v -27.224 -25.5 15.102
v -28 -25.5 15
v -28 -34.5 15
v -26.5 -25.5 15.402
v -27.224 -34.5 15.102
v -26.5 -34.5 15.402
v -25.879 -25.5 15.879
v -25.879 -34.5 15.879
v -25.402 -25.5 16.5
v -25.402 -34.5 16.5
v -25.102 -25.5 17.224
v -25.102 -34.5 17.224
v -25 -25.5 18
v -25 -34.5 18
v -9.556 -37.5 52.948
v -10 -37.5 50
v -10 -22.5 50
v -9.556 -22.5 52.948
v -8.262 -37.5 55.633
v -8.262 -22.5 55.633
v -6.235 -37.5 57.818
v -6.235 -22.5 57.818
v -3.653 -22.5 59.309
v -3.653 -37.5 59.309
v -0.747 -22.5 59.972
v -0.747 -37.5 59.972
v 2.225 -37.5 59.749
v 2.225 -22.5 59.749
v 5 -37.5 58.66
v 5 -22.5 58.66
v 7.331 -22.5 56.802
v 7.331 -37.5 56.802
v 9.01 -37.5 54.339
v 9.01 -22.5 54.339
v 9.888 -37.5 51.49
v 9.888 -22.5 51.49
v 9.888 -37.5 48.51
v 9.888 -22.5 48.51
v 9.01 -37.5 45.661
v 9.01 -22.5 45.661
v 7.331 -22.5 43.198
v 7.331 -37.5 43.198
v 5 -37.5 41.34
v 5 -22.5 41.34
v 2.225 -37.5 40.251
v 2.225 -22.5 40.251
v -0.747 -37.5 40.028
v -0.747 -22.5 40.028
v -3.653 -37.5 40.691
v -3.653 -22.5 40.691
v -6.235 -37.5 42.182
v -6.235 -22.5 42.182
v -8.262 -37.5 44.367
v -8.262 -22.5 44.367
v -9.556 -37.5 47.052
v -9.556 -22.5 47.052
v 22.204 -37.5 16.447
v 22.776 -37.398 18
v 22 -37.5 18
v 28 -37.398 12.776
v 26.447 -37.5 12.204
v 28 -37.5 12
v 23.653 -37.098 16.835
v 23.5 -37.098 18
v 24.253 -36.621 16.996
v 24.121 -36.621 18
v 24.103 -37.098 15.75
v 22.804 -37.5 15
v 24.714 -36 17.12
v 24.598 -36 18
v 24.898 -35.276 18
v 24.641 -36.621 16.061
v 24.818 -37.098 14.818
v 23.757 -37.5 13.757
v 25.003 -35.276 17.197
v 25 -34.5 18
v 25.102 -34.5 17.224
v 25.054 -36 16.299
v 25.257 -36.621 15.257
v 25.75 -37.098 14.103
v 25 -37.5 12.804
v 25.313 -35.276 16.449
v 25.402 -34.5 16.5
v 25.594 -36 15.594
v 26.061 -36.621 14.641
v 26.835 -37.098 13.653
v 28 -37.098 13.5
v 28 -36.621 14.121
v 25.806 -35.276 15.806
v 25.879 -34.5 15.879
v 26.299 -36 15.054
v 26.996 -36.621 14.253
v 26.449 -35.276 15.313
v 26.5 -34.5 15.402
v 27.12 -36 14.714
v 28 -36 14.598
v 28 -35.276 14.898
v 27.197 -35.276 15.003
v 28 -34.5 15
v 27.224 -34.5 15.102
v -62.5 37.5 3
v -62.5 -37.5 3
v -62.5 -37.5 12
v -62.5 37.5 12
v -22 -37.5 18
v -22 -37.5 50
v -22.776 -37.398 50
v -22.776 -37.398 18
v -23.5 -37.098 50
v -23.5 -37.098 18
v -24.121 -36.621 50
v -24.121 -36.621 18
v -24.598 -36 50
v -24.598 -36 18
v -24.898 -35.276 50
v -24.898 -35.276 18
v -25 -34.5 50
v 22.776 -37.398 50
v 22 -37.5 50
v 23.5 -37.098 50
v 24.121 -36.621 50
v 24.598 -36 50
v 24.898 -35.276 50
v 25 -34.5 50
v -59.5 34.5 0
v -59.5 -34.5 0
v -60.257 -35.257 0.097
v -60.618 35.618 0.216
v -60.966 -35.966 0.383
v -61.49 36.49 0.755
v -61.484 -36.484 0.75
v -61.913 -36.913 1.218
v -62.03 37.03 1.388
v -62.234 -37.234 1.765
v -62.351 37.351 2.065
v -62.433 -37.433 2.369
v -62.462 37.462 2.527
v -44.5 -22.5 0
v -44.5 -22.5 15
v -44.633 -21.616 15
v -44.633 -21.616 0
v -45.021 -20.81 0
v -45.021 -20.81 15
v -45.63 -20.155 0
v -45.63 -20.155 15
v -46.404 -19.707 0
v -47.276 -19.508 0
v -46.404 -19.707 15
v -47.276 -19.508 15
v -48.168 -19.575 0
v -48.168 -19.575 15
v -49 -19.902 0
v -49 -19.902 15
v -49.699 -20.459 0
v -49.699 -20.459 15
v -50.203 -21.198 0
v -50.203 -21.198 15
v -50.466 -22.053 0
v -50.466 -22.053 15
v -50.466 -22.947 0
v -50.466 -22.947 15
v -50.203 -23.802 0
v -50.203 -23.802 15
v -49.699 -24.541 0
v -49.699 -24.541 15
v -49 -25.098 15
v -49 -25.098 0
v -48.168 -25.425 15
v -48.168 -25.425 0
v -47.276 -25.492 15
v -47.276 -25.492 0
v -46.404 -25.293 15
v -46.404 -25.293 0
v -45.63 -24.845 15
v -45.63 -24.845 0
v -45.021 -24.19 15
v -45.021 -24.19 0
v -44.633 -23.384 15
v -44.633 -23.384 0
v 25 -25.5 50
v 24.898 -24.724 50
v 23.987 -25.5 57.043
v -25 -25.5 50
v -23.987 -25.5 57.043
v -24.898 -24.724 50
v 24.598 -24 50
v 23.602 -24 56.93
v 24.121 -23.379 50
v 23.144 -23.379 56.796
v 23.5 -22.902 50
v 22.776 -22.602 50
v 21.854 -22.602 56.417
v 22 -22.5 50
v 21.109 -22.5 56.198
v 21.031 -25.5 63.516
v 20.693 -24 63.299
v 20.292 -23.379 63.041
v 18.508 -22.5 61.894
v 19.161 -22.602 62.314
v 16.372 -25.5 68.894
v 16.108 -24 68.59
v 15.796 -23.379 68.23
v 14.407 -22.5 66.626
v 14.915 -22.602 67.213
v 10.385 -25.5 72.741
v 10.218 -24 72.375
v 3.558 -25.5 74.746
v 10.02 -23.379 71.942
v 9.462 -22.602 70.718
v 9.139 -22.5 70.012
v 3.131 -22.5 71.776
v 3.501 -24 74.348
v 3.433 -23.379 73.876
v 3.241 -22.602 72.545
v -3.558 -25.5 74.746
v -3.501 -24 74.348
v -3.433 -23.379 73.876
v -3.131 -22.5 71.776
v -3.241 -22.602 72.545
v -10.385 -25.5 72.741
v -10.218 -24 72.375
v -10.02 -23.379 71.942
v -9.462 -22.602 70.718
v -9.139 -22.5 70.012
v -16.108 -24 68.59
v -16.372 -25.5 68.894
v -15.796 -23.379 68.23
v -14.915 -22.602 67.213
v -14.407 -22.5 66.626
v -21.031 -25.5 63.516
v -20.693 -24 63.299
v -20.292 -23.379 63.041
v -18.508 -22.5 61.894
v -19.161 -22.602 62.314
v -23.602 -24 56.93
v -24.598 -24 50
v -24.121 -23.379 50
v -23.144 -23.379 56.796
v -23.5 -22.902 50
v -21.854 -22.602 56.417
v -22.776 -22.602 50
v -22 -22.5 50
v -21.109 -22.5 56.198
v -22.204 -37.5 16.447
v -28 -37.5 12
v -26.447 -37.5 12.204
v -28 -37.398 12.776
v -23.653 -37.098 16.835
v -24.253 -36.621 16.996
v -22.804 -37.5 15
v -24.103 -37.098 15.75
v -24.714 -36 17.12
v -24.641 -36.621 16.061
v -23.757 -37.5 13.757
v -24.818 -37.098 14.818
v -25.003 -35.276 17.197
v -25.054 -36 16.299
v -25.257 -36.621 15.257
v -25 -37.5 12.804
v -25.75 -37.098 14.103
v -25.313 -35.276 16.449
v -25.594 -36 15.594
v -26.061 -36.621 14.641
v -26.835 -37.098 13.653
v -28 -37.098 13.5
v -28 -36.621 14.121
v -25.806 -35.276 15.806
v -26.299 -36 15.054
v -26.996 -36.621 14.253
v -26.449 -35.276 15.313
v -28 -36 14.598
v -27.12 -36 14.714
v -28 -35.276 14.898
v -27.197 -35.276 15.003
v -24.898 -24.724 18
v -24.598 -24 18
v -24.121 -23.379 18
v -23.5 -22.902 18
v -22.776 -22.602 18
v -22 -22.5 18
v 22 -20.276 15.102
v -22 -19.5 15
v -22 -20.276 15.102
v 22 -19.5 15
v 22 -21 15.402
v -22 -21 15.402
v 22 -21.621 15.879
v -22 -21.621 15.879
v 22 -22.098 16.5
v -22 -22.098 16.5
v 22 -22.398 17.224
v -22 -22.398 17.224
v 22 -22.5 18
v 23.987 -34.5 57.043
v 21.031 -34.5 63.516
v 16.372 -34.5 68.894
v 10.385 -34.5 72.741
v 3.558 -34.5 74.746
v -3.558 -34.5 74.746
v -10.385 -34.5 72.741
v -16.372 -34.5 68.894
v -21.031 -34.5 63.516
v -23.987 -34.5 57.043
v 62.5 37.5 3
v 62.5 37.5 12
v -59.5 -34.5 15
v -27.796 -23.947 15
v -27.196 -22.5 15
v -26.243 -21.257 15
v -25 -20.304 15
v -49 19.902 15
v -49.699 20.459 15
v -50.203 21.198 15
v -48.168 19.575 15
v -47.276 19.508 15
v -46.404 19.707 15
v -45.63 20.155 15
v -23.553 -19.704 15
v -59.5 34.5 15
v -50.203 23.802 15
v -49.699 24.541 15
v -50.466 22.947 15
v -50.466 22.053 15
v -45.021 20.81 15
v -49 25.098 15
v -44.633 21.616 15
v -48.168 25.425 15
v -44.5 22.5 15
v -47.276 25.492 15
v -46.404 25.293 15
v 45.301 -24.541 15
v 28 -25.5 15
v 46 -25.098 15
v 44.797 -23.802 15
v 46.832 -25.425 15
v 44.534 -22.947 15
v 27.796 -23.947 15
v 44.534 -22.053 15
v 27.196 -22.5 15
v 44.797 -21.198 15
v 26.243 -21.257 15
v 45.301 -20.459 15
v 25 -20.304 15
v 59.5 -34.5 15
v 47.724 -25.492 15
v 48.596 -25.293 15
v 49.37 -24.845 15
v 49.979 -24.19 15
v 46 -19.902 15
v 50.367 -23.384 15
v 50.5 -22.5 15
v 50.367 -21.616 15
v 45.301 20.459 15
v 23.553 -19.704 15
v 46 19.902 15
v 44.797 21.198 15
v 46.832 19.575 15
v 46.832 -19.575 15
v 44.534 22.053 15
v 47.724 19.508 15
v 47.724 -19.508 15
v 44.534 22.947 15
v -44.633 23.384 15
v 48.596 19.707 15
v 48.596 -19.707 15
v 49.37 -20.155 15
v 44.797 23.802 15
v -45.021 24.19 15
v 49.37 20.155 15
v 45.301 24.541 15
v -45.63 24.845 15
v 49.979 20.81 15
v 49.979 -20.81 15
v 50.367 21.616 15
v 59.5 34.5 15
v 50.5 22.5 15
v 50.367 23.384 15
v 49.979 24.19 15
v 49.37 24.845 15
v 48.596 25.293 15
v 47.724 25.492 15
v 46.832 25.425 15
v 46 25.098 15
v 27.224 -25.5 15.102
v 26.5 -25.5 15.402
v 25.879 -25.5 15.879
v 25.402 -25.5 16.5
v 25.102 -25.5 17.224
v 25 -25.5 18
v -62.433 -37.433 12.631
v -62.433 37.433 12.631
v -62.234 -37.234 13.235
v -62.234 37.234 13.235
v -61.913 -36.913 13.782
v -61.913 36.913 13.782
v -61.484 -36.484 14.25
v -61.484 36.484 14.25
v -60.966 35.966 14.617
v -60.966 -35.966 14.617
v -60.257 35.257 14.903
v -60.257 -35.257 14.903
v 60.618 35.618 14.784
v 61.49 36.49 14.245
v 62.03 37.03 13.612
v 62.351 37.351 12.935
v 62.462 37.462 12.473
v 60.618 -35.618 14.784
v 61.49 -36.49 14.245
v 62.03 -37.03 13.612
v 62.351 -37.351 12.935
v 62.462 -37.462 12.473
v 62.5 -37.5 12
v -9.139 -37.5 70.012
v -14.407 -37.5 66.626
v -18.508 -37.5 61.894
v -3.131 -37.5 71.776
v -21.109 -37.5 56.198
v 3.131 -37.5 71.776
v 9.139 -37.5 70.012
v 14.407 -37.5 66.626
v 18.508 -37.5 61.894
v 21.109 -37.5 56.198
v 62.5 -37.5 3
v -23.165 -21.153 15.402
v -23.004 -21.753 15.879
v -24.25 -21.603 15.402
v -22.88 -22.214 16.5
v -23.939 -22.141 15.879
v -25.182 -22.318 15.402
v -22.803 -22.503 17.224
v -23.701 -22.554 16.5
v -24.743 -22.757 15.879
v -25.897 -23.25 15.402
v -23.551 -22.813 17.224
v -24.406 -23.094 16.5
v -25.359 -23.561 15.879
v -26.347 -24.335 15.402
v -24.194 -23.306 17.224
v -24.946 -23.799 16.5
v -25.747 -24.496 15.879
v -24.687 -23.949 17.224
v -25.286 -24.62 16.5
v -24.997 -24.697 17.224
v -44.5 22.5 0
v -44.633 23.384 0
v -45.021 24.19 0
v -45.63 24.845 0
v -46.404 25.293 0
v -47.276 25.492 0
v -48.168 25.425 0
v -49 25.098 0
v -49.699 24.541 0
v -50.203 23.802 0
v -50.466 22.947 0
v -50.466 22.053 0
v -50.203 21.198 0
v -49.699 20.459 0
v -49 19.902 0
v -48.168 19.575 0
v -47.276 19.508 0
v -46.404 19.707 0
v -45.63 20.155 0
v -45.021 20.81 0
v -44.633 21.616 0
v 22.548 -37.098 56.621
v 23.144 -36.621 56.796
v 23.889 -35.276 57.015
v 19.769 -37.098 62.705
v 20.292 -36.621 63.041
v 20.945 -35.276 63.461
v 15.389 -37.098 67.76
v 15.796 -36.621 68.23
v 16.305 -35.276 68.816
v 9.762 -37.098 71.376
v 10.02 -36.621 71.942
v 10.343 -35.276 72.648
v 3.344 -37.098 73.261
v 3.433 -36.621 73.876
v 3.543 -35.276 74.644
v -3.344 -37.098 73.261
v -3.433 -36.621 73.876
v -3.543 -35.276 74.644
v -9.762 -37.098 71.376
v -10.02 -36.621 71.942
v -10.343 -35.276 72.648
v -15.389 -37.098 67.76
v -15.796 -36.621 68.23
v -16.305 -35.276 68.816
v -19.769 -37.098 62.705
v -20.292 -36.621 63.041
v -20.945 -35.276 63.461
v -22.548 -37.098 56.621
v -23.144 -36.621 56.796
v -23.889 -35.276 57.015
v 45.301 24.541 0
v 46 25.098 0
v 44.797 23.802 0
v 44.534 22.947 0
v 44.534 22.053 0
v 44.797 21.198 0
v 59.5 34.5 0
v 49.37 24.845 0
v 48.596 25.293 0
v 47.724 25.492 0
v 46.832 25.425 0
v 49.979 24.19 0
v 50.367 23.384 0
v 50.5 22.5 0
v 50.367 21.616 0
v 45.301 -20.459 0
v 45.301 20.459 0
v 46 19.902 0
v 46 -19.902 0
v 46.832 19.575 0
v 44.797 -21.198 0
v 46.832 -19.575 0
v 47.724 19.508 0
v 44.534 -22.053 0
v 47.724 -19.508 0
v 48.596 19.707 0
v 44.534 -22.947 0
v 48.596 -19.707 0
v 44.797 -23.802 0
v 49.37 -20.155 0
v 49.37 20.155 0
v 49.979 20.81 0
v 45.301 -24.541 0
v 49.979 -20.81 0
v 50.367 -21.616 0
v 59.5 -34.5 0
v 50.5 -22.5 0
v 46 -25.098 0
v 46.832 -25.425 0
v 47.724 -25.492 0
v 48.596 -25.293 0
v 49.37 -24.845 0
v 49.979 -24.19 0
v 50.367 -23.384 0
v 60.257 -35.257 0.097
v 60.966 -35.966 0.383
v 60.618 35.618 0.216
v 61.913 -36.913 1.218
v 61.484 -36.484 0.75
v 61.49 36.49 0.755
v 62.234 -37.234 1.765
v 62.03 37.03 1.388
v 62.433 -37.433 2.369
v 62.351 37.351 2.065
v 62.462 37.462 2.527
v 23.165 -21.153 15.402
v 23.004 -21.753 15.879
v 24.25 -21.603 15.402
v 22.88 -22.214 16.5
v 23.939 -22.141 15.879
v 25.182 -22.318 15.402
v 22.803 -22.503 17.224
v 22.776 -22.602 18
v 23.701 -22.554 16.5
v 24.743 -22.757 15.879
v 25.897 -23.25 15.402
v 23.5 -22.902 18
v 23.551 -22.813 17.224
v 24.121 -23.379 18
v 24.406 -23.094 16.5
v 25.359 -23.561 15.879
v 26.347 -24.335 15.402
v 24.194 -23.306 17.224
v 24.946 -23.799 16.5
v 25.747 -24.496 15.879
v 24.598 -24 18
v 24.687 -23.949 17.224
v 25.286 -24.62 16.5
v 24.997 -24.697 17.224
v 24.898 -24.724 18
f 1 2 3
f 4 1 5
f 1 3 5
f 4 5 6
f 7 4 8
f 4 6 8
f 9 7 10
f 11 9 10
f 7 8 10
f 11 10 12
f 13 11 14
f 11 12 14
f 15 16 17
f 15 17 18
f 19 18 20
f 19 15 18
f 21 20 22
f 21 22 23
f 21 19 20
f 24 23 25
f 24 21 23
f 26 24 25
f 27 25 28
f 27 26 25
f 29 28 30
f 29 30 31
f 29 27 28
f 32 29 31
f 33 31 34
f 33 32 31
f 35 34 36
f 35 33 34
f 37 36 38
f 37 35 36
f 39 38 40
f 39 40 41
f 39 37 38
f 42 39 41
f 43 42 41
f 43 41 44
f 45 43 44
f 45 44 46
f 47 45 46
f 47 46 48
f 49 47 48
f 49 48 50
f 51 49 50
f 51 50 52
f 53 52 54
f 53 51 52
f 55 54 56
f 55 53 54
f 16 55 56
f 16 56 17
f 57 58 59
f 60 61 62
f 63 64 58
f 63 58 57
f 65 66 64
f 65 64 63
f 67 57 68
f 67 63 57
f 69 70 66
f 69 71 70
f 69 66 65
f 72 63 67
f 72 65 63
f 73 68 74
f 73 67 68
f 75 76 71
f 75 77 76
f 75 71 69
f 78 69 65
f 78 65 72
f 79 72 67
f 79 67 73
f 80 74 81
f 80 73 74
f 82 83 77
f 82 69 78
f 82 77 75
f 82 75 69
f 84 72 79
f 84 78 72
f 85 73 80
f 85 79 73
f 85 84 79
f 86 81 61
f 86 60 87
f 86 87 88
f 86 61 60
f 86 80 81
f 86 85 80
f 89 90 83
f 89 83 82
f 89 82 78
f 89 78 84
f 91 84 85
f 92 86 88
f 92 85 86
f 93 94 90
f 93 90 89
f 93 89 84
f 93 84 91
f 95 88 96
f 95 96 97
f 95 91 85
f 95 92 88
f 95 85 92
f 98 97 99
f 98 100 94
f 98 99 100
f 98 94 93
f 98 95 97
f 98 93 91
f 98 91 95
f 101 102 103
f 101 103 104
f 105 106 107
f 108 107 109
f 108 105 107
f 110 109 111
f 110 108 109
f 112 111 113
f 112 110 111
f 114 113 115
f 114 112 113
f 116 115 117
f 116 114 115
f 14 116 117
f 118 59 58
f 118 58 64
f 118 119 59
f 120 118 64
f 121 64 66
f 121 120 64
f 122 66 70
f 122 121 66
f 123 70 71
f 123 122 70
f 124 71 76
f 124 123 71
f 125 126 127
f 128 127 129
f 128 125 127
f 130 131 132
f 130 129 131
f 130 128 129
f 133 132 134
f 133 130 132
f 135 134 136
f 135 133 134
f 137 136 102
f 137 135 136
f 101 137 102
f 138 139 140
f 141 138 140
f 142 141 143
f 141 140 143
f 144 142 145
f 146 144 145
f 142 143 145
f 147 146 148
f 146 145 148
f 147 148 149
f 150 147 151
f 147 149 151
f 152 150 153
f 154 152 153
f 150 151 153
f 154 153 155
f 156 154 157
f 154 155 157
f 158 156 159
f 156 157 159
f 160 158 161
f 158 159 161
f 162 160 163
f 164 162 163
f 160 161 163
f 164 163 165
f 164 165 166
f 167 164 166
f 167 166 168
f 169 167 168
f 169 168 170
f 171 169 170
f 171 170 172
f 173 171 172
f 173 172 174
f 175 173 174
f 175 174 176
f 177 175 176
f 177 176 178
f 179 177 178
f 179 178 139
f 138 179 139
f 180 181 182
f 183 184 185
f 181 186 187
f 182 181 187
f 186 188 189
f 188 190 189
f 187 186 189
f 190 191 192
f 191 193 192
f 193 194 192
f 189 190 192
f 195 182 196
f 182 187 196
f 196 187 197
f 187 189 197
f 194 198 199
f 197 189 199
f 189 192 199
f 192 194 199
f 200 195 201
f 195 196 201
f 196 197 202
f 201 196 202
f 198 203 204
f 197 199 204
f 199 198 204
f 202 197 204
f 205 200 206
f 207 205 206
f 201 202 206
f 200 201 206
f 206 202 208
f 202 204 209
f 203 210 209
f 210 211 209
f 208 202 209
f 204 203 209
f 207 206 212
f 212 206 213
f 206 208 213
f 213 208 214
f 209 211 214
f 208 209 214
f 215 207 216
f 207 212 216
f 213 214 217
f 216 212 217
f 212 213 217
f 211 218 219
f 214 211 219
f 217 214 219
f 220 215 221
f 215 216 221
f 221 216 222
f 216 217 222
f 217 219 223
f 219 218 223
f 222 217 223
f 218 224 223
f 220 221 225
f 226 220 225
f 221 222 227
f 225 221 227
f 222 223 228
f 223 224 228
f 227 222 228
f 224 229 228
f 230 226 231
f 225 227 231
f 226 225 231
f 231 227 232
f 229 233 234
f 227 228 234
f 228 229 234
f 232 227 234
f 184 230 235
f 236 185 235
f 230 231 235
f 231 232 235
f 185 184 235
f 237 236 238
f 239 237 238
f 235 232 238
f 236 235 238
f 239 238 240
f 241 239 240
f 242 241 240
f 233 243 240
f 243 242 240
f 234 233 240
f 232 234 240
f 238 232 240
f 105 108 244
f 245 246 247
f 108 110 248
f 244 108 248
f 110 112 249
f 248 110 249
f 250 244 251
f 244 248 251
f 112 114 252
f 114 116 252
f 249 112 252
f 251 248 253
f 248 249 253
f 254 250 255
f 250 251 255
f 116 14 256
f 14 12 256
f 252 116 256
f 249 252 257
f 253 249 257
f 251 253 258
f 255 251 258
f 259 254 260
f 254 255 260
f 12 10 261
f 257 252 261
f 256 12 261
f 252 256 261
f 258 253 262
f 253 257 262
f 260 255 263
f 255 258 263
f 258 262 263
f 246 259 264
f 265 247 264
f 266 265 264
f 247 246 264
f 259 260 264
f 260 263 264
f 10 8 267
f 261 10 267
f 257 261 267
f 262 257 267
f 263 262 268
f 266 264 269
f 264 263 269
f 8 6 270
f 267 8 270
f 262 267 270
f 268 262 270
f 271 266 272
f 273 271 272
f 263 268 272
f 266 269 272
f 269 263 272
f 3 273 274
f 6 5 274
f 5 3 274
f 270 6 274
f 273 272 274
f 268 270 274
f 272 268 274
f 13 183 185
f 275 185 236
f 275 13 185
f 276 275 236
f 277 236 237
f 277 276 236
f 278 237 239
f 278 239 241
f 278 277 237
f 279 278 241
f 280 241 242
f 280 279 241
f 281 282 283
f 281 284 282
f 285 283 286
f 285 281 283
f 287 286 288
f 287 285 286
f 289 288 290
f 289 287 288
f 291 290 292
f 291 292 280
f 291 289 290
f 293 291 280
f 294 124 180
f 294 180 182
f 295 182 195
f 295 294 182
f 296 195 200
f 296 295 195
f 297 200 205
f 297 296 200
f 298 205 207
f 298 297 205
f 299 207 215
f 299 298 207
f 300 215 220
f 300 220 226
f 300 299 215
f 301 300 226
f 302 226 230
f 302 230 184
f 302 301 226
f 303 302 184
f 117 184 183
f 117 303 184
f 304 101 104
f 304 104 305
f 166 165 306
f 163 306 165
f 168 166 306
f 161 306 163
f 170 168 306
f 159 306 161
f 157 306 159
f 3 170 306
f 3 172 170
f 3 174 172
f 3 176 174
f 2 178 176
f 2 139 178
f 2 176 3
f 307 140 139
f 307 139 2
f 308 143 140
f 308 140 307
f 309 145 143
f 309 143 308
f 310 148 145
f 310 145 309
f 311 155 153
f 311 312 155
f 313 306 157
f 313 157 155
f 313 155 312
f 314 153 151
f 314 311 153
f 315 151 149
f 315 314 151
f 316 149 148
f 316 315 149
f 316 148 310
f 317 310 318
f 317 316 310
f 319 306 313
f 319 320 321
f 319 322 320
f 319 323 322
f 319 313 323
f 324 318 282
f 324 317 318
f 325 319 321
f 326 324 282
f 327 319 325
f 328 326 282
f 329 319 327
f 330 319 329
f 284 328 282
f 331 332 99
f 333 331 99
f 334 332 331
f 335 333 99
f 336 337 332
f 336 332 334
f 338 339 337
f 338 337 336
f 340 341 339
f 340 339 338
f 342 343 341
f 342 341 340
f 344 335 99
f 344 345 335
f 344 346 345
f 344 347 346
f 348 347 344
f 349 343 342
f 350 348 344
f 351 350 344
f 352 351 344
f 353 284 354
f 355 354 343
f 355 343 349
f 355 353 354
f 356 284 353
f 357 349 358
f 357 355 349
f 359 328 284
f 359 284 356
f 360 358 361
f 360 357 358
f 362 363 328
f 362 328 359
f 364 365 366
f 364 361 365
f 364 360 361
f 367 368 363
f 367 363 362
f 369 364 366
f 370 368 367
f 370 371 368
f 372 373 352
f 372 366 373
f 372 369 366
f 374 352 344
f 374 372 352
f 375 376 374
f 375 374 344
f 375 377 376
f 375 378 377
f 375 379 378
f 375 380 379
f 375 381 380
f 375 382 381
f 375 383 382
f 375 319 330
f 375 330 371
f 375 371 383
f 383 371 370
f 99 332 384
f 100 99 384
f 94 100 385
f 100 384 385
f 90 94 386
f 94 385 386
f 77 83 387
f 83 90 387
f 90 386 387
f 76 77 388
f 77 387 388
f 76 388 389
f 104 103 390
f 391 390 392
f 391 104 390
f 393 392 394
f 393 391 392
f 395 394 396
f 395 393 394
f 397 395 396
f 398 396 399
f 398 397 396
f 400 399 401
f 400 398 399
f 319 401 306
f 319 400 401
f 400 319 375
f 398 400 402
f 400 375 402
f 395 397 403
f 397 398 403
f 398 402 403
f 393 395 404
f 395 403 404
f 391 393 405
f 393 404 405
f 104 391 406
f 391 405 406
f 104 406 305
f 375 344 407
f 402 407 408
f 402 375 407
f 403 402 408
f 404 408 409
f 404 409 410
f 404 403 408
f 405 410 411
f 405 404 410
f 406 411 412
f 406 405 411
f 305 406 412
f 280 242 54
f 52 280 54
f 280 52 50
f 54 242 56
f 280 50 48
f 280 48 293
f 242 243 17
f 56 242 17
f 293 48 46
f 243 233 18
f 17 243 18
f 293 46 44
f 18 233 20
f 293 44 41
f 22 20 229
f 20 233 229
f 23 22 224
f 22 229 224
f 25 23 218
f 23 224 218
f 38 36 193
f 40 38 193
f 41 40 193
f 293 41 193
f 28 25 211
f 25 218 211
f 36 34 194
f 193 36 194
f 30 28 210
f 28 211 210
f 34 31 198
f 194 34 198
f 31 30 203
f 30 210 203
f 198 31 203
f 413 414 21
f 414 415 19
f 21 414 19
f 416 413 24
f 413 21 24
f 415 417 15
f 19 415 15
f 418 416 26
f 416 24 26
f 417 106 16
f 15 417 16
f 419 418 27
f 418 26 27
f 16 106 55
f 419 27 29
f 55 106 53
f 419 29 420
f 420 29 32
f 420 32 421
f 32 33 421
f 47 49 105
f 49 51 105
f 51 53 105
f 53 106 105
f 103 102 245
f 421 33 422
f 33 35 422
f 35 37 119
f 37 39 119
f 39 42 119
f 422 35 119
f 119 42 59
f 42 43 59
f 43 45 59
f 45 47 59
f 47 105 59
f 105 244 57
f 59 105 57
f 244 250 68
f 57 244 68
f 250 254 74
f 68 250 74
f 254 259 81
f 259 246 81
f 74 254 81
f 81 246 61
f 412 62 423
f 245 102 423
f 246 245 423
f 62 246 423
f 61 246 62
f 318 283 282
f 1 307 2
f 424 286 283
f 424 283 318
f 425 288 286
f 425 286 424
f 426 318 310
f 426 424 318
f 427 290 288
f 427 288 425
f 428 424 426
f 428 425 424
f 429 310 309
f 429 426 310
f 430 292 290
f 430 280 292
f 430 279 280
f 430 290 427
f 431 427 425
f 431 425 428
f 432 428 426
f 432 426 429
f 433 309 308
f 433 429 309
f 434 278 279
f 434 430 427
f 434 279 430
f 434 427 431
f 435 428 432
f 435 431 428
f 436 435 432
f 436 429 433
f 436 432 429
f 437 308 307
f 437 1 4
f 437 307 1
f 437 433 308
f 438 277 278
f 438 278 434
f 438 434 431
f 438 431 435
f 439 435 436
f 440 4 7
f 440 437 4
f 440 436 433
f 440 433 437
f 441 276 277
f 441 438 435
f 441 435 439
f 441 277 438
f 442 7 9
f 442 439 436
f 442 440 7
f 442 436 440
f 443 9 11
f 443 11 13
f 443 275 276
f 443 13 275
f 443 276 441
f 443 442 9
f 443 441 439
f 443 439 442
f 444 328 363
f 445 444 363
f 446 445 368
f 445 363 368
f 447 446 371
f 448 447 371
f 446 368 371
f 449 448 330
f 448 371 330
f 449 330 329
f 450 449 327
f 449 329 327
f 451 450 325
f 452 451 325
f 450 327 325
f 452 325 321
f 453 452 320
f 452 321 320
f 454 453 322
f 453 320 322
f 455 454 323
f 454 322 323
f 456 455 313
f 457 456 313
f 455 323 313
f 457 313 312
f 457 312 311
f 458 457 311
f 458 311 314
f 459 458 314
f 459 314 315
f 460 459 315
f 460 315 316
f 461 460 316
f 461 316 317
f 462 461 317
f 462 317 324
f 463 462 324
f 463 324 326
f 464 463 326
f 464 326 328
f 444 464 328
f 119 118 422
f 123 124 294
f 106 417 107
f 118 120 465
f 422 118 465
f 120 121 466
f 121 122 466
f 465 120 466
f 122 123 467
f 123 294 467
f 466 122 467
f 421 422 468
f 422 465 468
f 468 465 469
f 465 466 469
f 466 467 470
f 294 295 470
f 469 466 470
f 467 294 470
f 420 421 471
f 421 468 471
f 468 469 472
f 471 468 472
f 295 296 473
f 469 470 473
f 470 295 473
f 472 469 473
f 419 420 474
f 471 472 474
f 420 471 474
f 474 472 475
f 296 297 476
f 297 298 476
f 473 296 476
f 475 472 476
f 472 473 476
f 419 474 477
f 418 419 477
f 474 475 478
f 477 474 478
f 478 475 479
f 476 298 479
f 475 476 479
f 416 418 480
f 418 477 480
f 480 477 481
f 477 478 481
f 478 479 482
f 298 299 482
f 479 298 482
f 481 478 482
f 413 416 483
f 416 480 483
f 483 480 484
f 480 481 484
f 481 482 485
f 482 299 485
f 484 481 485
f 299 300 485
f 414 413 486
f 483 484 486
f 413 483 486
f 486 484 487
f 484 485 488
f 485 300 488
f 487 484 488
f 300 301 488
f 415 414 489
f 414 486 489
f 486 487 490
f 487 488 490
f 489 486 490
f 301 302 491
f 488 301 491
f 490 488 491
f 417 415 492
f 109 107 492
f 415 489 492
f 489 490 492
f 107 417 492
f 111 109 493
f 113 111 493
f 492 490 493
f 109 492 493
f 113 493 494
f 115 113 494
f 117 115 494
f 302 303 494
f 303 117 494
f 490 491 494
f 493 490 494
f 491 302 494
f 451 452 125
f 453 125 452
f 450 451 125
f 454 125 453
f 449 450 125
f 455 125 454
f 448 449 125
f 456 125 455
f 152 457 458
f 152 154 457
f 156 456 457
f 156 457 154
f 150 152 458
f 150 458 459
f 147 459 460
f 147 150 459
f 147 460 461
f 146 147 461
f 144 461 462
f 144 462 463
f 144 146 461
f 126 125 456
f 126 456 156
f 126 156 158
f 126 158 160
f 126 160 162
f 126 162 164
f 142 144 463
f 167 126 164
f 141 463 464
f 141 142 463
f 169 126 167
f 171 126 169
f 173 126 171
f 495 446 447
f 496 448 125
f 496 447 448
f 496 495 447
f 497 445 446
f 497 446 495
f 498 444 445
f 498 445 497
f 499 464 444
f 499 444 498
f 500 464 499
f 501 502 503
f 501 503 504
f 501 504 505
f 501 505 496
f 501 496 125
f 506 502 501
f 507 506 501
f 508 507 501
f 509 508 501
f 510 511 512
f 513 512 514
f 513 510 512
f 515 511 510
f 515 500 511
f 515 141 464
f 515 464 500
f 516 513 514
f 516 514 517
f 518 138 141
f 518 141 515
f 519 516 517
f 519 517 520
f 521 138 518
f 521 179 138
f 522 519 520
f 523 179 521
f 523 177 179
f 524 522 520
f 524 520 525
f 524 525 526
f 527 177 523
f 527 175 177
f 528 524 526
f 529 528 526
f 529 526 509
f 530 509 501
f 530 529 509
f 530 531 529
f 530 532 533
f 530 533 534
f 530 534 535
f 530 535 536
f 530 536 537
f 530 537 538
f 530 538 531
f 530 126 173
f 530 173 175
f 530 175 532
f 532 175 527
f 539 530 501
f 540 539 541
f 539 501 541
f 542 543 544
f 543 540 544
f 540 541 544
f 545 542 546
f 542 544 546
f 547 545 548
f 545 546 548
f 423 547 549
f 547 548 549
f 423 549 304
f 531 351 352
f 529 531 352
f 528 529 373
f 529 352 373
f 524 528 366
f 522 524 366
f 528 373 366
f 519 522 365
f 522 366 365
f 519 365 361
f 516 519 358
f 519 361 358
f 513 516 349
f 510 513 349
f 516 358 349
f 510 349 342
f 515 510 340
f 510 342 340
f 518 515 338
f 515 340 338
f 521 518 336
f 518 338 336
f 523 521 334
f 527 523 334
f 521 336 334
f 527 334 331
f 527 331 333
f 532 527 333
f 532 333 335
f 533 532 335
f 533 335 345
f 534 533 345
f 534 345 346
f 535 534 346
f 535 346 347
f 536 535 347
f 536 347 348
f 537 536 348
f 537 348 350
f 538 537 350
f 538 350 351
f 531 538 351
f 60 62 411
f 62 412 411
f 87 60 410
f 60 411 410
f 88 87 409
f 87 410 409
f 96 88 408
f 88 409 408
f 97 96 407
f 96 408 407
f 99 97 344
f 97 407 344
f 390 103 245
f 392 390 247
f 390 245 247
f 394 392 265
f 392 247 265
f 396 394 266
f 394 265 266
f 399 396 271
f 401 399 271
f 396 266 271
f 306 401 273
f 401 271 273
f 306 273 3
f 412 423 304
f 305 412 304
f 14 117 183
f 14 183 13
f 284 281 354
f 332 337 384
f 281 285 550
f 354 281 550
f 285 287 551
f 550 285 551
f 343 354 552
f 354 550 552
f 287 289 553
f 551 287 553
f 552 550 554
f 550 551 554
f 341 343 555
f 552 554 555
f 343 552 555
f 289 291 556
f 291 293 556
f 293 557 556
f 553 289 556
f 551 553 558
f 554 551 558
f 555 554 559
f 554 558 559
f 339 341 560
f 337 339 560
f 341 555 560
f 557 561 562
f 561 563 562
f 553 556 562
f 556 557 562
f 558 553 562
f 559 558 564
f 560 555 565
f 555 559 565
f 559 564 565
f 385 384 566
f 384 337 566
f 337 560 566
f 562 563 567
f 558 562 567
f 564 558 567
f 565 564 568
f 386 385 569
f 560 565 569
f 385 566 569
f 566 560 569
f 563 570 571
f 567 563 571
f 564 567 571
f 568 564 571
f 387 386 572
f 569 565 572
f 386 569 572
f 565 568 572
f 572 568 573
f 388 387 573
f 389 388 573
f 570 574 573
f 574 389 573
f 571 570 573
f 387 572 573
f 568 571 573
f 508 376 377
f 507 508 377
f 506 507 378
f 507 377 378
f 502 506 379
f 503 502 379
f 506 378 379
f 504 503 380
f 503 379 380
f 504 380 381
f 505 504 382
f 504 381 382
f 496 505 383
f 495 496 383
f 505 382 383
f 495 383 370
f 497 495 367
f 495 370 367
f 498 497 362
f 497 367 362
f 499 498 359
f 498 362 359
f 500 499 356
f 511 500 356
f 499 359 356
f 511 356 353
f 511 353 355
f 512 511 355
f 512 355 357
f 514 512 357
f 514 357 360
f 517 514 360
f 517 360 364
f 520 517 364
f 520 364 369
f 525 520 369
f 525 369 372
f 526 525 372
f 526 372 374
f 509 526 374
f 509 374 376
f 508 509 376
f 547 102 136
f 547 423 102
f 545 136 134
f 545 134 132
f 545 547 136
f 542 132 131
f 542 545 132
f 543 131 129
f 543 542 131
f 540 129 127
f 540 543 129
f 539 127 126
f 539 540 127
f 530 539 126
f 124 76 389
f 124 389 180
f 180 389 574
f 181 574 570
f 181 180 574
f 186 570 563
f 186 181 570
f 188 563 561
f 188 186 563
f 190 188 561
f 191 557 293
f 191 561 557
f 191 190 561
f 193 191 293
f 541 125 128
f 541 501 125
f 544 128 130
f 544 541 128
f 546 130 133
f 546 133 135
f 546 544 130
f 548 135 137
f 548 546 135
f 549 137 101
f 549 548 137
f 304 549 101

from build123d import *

# Parameters (mm, degrees)
F0_W     = 125
F0_H     = 75
F1_DEPTH = 15
F2_W     = 50
F2_H     = 15
F3_DEPTH = 15
F4_R     = 3
F5_DEPTH = 15.001
F6_R     = 3


with BuildPart() as f1:
    # F0 (on Top) → F1 (new body)
    with BuildSketch(Plane.XY):
        Rectangle(F0_W, F0_H)
    extrude(amount=F1_DEPTH)

    # F2 (on face) → F3 (join)
    with BuildSketch(Plane.XZ.offset(37.5)):
        with Locations((0, 7.5)):
            Rectangle(F2_W, F2_H)
        with BuildLine():
            Line((25, 15), (25, 50))
            ThreePointArc((25, 50), (0, 25), (-25, 50))
            Line((-25, 50), (-25, 15))
            Line((-25, 15), (25, 15))
        make_face()
        with BuildLine():
            ThreePointArc((-25, 50), (0, 25), (25, 50))
            Line((25, 50), (10, 50))
            ThreePointArc((10, 50), (0, 40), (-10, 50))
            Line((-10, 50), (-25, 50))
        make_face()
        with BuildLine():
            Line((10, 50), (25, 50))
            ThreePointArc((25, 50), (0, 75), (-25, 50))
            Line((-25, 50), (-10, 50))
            ThreePointArc((-10, 50), (0, 60), (10, 50))
        make_face()
    extrude(amount=-F3_DEPTH)

    # F4 (on face) → F5 (cut, through all)
    with BuildSketch(Plane.XY.offset(15)):
        with Locations((-47.5, 22.5)):
            Circle(F4_R)
        with Locations((-47.5, -22.5)):
            Circle(F4_R)
        with Locations((47.5, 22.5)):
            Circle(F4_R)
        with Locations((47.5, -22.5)):
            Circle(F4_R)
    extrude(amount=-F5_DEPTH, mode=Mode.SUBTRACT)

    # F6
    f6_edges = [f1.edges().sort_by_distance(p)[0] for p in [
        (-43.75, -37.5, 15),
        (-62.5, 0, 15),
        (0, 37.5, 15),
        (62.5, 0, 15),
        (43.75, -37.5, 15),
        (25, -30, 15),
        (-25, -30, 15),
        (-25, -22.5, 32.5),
        (0, -37.5, 0),
        (62.5, 0, 0),
        (0, 37.5, 0),
        (-62.5, 0, 0),
        (-25, -37.5, 32.5),
        (0, -37.5, 75),
        (25, -37.5, 32.5),
        (0, -22.5, 15),
        (0, -22.5, 75),
        (25, -22.5, 32.5),
    ]]
    fillet(f6_edges, radius=F6_R)


solid = f1.part
